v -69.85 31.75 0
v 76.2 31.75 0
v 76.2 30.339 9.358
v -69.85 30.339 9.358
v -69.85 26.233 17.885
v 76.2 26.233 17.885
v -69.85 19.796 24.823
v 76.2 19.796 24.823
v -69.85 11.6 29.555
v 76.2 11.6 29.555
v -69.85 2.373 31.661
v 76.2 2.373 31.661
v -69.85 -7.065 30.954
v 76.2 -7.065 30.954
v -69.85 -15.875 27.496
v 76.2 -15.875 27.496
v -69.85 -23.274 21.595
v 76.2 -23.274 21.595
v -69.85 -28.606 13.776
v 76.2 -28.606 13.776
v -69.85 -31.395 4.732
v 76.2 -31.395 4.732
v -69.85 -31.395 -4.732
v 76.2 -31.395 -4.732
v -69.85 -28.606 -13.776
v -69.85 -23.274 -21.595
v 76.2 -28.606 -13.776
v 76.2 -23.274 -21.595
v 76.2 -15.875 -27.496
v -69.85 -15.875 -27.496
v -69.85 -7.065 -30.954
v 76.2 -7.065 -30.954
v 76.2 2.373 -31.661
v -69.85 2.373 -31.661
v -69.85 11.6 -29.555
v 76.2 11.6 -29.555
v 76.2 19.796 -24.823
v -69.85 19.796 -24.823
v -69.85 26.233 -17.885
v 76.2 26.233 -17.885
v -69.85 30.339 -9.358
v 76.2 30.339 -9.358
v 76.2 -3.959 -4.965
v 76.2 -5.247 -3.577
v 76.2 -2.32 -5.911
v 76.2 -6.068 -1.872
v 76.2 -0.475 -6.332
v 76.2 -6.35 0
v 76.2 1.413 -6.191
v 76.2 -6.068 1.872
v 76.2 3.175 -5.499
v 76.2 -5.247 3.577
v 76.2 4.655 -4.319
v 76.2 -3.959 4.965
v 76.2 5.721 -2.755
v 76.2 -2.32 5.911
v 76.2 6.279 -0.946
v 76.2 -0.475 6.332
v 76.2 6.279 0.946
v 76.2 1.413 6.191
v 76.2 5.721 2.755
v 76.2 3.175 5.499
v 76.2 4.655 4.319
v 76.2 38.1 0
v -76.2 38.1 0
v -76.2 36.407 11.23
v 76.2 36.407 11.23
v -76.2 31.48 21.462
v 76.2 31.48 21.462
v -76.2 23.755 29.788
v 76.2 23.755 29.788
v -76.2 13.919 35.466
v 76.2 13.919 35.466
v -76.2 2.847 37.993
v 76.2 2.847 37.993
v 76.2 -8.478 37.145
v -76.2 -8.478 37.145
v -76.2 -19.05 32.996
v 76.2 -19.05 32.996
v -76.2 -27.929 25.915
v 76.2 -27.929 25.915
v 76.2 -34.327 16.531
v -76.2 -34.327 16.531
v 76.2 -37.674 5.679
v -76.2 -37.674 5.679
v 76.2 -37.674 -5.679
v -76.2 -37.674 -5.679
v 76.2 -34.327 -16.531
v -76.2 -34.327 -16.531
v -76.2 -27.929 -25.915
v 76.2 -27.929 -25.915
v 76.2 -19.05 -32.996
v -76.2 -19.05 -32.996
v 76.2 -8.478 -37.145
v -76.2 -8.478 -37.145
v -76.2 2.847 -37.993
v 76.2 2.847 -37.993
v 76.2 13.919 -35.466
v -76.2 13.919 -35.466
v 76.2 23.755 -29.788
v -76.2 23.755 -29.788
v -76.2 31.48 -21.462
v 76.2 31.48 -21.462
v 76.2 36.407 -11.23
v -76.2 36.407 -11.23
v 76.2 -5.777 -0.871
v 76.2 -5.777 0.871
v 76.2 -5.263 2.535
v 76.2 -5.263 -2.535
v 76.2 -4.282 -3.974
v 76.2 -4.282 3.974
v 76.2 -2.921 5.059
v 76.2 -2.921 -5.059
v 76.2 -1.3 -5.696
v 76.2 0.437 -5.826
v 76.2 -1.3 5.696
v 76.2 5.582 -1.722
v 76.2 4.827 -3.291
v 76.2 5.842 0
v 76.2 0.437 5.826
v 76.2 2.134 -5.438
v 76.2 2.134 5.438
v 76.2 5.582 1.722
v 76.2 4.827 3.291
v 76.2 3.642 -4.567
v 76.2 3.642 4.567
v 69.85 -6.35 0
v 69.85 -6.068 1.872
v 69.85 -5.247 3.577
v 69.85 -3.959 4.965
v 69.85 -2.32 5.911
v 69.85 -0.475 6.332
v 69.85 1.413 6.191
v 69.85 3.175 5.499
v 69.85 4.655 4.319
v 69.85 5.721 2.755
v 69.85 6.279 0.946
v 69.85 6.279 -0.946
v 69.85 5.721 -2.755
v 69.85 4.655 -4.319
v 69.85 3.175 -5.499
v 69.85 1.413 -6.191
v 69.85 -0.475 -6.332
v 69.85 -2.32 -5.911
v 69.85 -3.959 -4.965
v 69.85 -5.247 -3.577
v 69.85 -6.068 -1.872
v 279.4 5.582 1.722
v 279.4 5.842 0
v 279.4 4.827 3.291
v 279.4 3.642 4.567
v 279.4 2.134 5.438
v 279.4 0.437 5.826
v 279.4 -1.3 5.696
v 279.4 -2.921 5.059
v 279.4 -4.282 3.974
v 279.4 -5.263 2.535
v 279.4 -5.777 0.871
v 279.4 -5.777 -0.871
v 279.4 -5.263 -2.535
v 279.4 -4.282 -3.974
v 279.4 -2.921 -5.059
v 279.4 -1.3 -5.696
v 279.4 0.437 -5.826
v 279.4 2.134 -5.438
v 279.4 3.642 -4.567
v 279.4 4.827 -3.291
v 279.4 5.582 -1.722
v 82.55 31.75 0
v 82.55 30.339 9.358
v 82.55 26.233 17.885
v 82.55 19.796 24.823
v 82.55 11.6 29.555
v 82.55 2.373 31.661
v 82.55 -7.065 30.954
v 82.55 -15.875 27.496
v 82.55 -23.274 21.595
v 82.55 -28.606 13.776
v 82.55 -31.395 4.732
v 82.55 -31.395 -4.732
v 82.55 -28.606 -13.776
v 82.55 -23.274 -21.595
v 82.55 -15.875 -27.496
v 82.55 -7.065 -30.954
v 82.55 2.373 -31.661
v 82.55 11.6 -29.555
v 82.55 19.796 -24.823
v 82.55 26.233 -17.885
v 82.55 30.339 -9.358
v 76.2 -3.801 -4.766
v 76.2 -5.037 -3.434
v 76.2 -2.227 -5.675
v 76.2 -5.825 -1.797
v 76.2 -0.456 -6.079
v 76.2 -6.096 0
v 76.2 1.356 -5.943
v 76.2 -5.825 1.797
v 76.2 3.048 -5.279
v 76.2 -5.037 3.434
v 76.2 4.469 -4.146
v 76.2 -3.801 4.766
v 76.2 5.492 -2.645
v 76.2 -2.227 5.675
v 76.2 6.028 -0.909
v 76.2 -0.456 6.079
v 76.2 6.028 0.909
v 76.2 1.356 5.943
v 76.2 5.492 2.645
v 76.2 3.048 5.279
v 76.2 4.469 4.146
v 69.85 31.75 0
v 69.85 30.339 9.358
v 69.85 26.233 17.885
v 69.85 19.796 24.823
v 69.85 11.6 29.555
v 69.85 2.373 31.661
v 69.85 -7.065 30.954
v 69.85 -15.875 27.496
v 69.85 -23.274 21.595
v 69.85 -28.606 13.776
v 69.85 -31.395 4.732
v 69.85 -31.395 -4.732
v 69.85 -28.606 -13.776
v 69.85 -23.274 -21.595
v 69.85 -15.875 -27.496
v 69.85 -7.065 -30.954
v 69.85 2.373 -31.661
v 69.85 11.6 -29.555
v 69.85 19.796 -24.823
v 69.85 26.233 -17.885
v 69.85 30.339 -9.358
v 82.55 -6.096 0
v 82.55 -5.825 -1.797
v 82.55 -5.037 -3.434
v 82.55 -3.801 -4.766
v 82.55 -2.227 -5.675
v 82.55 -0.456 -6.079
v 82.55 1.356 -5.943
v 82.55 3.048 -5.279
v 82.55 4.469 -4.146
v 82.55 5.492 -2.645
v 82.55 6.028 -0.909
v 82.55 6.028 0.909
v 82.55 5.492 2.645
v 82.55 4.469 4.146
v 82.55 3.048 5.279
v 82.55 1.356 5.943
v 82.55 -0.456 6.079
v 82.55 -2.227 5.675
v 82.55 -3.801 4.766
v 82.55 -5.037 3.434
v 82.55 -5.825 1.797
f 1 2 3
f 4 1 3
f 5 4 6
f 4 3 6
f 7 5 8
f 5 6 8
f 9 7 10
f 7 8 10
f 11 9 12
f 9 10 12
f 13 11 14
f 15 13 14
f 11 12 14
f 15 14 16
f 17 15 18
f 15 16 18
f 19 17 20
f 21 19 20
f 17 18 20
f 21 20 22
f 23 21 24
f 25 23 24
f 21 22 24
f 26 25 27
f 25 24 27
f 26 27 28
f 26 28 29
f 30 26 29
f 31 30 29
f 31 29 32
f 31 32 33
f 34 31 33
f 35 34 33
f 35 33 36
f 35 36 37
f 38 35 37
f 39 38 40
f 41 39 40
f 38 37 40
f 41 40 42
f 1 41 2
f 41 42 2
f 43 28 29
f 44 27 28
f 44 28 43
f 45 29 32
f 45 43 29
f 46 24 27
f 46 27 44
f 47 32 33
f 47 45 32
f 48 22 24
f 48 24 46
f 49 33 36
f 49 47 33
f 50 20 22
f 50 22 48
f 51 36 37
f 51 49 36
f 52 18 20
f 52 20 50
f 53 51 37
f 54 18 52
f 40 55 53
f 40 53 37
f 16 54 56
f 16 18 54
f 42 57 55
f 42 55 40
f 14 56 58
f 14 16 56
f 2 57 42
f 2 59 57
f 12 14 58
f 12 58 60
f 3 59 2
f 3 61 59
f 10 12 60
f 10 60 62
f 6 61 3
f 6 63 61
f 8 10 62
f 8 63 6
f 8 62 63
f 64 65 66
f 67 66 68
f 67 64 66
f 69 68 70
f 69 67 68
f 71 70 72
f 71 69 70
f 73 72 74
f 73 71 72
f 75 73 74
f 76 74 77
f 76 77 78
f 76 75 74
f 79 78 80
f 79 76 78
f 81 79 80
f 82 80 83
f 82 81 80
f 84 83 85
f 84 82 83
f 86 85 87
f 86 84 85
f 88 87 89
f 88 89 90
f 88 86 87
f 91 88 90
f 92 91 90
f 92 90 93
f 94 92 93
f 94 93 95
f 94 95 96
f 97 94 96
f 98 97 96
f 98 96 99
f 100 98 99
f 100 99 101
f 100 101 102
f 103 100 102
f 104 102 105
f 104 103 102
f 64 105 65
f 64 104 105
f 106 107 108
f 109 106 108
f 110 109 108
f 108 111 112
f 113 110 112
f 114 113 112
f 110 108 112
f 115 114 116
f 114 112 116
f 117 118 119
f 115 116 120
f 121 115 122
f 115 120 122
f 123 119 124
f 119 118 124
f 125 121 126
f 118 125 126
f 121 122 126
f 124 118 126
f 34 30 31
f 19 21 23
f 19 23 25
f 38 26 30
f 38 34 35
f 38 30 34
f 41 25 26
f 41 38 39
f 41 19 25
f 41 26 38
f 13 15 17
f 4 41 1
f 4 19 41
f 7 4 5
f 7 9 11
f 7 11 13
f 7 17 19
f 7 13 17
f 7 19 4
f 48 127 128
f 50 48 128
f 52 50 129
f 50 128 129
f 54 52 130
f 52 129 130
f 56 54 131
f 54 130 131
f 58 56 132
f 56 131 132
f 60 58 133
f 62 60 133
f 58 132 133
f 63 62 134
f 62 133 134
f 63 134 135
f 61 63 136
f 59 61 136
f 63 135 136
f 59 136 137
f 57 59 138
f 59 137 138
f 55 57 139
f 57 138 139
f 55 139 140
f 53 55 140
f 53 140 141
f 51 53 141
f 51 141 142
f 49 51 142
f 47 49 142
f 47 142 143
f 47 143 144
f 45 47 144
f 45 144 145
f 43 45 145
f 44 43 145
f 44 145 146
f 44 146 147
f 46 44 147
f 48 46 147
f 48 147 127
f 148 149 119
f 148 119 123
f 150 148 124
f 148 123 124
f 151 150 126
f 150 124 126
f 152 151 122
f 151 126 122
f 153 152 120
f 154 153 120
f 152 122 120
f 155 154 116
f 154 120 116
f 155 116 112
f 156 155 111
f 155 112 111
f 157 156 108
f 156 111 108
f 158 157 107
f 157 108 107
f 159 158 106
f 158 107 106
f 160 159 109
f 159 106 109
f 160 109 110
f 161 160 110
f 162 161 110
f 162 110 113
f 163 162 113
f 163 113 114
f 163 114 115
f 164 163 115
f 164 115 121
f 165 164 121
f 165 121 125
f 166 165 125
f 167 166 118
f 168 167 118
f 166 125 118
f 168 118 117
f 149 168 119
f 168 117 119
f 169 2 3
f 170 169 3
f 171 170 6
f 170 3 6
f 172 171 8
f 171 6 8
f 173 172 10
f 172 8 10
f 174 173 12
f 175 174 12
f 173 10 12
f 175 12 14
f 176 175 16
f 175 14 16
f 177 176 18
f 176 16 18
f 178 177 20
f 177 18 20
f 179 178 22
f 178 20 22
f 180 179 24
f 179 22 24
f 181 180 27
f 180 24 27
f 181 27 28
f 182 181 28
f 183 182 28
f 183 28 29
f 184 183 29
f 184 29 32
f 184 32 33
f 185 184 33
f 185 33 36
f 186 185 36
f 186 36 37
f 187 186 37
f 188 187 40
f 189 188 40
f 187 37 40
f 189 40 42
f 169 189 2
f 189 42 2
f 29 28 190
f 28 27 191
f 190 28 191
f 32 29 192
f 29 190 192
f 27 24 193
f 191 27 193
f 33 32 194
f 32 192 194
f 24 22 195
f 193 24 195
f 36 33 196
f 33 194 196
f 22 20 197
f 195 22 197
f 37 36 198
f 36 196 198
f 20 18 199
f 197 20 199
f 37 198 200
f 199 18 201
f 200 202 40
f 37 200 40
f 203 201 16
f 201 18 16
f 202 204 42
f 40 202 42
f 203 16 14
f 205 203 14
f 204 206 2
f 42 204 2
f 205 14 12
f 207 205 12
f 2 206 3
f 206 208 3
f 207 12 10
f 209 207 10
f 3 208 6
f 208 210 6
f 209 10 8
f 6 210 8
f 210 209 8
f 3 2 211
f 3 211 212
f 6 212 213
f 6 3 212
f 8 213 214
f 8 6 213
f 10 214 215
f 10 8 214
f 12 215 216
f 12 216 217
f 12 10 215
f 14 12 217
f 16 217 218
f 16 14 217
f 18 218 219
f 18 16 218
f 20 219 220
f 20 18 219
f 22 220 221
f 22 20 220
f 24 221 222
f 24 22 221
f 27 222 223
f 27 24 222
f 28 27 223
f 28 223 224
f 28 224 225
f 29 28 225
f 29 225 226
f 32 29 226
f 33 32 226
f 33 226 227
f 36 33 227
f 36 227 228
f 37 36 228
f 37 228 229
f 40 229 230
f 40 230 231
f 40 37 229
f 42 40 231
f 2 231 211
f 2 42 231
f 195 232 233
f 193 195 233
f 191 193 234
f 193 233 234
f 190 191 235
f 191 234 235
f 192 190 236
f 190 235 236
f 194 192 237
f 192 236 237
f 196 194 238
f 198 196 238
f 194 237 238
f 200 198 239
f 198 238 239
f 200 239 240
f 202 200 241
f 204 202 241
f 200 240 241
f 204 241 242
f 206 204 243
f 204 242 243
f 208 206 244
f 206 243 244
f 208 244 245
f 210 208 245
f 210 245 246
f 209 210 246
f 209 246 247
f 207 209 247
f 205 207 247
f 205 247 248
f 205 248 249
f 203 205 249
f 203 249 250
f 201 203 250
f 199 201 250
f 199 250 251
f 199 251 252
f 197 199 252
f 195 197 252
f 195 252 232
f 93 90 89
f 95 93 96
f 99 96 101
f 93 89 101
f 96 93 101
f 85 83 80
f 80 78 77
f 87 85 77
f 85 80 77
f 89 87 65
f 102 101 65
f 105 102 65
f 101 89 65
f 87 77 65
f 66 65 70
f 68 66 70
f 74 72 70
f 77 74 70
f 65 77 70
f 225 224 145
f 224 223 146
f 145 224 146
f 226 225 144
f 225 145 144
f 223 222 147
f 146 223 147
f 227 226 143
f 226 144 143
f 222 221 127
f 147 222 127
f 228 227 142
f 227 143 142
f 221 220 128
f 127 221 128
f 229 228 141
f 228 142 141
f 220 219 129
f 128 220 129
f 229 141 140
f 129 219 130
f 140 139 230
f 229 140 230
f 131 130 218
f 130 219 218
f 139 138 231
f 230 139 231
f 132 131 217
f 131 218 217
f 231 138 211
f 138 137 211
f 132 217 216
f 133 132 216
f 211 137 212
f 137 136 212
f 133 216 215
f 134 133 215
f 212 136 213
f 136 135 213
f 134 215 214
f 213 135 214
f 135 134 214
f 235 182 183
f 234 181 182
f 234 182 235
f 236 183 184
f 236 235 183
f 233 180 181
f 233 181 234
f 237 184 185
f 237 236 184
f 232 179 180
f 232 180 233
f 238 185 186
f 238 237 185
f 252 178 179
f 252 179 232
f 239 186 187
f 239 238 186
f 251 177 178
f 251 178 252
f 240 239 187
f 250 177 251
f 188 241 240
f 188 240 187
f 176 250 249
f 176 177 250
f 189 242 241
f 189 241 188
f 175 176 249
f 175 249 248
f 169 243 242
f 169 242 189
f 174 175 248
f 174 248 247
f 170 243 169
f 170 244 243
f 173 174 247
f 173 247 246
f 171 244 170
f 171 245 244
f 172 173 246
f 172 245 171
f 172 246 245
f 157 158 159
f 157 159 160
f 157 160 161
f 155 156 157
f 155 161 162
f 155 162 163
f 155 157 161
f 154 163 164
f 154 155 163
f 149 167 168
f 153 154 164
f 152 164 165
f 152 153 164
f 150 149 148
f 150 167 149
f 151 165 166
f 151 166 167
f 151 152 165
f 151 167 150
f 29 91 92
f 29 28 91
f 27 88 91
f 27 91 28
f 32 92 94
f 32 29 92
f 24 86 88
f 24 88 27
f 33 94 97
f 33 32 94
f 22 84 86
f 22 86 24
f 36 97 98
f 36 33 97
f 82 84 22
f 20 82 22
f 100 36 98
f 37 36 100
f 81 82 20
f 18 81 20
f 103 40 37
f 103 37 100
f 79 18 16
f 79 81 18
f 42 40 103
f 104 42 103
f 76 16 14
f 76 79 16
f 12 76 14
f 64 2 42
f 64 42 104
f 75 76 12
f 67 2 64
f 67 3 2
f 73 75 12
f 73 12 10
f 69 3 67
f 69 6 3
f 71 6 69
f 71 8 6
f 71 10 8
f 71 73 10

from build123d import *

# Parameters (mm, degrees)
F0_R     = 38.1
F1_DEPTH = 76.2
F2_T     = -6.35
F4_R     = 5.842
F5_DEPTH = 203.2
F6_R     = 31.75
F7_DEPTH = 6.35
F3_R     = 31.75
F8_DEPTH = 6.35
F9_D     = 12.7
F10_D    = 12.192


with BuildPart() as f1:
    # F0 (on Right) → F1 (new body, symmetric)
    with BuildSketch(Plane.YZ):
        Circle(F0_R)
    extrude(amount=F1_DEPTH, both=True)

    # F2
    f2_openings = [f1.faces().sort_by_distance(p)[0] for p in [
        (76.2, 0, 0),
    ]]
    offset(amount=F2_T, openings=f2_openings)


with BuildPart() as f5:
    # F4 (on face) → F5 (new body)
    with BuildSketch(Plane.YZ.offset(76.2)):
        Circle(F4_R)
    extrude(amount=F5_DEPTH)


with BuildPart() as f7:
    # F6 (on face) → F7 (new body)
    with BuildSketch(Plane.YZ.offset(76.2)):
        Circle(F6_R)
    extrude(amount=F7_DEPTH)

    # F10 (through all)
    with Locations(Plane(origin=(76.2, 0, 0), x_dir=(0, 1, 0), z_dir=(-1, 0, 0))):
        with Locations((0, 0)):
            Hole(F10_D / 2)


with BuildPart() as f8:
    # F3 (on face) → F8 (new body)
    with BuildSketch(Plane.YZ.offset(76.2)):
        Circle(F3_R)
    extrude(amount=-F8_DEPTH)

    # F9 (through all)
    with Locations(Plane.YZ.offset(76.2)):
        with Locations((0, 0)):
            Hole(F9_D / 2)


solid = Compound([f1.part, f5.part, f7.part, f8.part])
